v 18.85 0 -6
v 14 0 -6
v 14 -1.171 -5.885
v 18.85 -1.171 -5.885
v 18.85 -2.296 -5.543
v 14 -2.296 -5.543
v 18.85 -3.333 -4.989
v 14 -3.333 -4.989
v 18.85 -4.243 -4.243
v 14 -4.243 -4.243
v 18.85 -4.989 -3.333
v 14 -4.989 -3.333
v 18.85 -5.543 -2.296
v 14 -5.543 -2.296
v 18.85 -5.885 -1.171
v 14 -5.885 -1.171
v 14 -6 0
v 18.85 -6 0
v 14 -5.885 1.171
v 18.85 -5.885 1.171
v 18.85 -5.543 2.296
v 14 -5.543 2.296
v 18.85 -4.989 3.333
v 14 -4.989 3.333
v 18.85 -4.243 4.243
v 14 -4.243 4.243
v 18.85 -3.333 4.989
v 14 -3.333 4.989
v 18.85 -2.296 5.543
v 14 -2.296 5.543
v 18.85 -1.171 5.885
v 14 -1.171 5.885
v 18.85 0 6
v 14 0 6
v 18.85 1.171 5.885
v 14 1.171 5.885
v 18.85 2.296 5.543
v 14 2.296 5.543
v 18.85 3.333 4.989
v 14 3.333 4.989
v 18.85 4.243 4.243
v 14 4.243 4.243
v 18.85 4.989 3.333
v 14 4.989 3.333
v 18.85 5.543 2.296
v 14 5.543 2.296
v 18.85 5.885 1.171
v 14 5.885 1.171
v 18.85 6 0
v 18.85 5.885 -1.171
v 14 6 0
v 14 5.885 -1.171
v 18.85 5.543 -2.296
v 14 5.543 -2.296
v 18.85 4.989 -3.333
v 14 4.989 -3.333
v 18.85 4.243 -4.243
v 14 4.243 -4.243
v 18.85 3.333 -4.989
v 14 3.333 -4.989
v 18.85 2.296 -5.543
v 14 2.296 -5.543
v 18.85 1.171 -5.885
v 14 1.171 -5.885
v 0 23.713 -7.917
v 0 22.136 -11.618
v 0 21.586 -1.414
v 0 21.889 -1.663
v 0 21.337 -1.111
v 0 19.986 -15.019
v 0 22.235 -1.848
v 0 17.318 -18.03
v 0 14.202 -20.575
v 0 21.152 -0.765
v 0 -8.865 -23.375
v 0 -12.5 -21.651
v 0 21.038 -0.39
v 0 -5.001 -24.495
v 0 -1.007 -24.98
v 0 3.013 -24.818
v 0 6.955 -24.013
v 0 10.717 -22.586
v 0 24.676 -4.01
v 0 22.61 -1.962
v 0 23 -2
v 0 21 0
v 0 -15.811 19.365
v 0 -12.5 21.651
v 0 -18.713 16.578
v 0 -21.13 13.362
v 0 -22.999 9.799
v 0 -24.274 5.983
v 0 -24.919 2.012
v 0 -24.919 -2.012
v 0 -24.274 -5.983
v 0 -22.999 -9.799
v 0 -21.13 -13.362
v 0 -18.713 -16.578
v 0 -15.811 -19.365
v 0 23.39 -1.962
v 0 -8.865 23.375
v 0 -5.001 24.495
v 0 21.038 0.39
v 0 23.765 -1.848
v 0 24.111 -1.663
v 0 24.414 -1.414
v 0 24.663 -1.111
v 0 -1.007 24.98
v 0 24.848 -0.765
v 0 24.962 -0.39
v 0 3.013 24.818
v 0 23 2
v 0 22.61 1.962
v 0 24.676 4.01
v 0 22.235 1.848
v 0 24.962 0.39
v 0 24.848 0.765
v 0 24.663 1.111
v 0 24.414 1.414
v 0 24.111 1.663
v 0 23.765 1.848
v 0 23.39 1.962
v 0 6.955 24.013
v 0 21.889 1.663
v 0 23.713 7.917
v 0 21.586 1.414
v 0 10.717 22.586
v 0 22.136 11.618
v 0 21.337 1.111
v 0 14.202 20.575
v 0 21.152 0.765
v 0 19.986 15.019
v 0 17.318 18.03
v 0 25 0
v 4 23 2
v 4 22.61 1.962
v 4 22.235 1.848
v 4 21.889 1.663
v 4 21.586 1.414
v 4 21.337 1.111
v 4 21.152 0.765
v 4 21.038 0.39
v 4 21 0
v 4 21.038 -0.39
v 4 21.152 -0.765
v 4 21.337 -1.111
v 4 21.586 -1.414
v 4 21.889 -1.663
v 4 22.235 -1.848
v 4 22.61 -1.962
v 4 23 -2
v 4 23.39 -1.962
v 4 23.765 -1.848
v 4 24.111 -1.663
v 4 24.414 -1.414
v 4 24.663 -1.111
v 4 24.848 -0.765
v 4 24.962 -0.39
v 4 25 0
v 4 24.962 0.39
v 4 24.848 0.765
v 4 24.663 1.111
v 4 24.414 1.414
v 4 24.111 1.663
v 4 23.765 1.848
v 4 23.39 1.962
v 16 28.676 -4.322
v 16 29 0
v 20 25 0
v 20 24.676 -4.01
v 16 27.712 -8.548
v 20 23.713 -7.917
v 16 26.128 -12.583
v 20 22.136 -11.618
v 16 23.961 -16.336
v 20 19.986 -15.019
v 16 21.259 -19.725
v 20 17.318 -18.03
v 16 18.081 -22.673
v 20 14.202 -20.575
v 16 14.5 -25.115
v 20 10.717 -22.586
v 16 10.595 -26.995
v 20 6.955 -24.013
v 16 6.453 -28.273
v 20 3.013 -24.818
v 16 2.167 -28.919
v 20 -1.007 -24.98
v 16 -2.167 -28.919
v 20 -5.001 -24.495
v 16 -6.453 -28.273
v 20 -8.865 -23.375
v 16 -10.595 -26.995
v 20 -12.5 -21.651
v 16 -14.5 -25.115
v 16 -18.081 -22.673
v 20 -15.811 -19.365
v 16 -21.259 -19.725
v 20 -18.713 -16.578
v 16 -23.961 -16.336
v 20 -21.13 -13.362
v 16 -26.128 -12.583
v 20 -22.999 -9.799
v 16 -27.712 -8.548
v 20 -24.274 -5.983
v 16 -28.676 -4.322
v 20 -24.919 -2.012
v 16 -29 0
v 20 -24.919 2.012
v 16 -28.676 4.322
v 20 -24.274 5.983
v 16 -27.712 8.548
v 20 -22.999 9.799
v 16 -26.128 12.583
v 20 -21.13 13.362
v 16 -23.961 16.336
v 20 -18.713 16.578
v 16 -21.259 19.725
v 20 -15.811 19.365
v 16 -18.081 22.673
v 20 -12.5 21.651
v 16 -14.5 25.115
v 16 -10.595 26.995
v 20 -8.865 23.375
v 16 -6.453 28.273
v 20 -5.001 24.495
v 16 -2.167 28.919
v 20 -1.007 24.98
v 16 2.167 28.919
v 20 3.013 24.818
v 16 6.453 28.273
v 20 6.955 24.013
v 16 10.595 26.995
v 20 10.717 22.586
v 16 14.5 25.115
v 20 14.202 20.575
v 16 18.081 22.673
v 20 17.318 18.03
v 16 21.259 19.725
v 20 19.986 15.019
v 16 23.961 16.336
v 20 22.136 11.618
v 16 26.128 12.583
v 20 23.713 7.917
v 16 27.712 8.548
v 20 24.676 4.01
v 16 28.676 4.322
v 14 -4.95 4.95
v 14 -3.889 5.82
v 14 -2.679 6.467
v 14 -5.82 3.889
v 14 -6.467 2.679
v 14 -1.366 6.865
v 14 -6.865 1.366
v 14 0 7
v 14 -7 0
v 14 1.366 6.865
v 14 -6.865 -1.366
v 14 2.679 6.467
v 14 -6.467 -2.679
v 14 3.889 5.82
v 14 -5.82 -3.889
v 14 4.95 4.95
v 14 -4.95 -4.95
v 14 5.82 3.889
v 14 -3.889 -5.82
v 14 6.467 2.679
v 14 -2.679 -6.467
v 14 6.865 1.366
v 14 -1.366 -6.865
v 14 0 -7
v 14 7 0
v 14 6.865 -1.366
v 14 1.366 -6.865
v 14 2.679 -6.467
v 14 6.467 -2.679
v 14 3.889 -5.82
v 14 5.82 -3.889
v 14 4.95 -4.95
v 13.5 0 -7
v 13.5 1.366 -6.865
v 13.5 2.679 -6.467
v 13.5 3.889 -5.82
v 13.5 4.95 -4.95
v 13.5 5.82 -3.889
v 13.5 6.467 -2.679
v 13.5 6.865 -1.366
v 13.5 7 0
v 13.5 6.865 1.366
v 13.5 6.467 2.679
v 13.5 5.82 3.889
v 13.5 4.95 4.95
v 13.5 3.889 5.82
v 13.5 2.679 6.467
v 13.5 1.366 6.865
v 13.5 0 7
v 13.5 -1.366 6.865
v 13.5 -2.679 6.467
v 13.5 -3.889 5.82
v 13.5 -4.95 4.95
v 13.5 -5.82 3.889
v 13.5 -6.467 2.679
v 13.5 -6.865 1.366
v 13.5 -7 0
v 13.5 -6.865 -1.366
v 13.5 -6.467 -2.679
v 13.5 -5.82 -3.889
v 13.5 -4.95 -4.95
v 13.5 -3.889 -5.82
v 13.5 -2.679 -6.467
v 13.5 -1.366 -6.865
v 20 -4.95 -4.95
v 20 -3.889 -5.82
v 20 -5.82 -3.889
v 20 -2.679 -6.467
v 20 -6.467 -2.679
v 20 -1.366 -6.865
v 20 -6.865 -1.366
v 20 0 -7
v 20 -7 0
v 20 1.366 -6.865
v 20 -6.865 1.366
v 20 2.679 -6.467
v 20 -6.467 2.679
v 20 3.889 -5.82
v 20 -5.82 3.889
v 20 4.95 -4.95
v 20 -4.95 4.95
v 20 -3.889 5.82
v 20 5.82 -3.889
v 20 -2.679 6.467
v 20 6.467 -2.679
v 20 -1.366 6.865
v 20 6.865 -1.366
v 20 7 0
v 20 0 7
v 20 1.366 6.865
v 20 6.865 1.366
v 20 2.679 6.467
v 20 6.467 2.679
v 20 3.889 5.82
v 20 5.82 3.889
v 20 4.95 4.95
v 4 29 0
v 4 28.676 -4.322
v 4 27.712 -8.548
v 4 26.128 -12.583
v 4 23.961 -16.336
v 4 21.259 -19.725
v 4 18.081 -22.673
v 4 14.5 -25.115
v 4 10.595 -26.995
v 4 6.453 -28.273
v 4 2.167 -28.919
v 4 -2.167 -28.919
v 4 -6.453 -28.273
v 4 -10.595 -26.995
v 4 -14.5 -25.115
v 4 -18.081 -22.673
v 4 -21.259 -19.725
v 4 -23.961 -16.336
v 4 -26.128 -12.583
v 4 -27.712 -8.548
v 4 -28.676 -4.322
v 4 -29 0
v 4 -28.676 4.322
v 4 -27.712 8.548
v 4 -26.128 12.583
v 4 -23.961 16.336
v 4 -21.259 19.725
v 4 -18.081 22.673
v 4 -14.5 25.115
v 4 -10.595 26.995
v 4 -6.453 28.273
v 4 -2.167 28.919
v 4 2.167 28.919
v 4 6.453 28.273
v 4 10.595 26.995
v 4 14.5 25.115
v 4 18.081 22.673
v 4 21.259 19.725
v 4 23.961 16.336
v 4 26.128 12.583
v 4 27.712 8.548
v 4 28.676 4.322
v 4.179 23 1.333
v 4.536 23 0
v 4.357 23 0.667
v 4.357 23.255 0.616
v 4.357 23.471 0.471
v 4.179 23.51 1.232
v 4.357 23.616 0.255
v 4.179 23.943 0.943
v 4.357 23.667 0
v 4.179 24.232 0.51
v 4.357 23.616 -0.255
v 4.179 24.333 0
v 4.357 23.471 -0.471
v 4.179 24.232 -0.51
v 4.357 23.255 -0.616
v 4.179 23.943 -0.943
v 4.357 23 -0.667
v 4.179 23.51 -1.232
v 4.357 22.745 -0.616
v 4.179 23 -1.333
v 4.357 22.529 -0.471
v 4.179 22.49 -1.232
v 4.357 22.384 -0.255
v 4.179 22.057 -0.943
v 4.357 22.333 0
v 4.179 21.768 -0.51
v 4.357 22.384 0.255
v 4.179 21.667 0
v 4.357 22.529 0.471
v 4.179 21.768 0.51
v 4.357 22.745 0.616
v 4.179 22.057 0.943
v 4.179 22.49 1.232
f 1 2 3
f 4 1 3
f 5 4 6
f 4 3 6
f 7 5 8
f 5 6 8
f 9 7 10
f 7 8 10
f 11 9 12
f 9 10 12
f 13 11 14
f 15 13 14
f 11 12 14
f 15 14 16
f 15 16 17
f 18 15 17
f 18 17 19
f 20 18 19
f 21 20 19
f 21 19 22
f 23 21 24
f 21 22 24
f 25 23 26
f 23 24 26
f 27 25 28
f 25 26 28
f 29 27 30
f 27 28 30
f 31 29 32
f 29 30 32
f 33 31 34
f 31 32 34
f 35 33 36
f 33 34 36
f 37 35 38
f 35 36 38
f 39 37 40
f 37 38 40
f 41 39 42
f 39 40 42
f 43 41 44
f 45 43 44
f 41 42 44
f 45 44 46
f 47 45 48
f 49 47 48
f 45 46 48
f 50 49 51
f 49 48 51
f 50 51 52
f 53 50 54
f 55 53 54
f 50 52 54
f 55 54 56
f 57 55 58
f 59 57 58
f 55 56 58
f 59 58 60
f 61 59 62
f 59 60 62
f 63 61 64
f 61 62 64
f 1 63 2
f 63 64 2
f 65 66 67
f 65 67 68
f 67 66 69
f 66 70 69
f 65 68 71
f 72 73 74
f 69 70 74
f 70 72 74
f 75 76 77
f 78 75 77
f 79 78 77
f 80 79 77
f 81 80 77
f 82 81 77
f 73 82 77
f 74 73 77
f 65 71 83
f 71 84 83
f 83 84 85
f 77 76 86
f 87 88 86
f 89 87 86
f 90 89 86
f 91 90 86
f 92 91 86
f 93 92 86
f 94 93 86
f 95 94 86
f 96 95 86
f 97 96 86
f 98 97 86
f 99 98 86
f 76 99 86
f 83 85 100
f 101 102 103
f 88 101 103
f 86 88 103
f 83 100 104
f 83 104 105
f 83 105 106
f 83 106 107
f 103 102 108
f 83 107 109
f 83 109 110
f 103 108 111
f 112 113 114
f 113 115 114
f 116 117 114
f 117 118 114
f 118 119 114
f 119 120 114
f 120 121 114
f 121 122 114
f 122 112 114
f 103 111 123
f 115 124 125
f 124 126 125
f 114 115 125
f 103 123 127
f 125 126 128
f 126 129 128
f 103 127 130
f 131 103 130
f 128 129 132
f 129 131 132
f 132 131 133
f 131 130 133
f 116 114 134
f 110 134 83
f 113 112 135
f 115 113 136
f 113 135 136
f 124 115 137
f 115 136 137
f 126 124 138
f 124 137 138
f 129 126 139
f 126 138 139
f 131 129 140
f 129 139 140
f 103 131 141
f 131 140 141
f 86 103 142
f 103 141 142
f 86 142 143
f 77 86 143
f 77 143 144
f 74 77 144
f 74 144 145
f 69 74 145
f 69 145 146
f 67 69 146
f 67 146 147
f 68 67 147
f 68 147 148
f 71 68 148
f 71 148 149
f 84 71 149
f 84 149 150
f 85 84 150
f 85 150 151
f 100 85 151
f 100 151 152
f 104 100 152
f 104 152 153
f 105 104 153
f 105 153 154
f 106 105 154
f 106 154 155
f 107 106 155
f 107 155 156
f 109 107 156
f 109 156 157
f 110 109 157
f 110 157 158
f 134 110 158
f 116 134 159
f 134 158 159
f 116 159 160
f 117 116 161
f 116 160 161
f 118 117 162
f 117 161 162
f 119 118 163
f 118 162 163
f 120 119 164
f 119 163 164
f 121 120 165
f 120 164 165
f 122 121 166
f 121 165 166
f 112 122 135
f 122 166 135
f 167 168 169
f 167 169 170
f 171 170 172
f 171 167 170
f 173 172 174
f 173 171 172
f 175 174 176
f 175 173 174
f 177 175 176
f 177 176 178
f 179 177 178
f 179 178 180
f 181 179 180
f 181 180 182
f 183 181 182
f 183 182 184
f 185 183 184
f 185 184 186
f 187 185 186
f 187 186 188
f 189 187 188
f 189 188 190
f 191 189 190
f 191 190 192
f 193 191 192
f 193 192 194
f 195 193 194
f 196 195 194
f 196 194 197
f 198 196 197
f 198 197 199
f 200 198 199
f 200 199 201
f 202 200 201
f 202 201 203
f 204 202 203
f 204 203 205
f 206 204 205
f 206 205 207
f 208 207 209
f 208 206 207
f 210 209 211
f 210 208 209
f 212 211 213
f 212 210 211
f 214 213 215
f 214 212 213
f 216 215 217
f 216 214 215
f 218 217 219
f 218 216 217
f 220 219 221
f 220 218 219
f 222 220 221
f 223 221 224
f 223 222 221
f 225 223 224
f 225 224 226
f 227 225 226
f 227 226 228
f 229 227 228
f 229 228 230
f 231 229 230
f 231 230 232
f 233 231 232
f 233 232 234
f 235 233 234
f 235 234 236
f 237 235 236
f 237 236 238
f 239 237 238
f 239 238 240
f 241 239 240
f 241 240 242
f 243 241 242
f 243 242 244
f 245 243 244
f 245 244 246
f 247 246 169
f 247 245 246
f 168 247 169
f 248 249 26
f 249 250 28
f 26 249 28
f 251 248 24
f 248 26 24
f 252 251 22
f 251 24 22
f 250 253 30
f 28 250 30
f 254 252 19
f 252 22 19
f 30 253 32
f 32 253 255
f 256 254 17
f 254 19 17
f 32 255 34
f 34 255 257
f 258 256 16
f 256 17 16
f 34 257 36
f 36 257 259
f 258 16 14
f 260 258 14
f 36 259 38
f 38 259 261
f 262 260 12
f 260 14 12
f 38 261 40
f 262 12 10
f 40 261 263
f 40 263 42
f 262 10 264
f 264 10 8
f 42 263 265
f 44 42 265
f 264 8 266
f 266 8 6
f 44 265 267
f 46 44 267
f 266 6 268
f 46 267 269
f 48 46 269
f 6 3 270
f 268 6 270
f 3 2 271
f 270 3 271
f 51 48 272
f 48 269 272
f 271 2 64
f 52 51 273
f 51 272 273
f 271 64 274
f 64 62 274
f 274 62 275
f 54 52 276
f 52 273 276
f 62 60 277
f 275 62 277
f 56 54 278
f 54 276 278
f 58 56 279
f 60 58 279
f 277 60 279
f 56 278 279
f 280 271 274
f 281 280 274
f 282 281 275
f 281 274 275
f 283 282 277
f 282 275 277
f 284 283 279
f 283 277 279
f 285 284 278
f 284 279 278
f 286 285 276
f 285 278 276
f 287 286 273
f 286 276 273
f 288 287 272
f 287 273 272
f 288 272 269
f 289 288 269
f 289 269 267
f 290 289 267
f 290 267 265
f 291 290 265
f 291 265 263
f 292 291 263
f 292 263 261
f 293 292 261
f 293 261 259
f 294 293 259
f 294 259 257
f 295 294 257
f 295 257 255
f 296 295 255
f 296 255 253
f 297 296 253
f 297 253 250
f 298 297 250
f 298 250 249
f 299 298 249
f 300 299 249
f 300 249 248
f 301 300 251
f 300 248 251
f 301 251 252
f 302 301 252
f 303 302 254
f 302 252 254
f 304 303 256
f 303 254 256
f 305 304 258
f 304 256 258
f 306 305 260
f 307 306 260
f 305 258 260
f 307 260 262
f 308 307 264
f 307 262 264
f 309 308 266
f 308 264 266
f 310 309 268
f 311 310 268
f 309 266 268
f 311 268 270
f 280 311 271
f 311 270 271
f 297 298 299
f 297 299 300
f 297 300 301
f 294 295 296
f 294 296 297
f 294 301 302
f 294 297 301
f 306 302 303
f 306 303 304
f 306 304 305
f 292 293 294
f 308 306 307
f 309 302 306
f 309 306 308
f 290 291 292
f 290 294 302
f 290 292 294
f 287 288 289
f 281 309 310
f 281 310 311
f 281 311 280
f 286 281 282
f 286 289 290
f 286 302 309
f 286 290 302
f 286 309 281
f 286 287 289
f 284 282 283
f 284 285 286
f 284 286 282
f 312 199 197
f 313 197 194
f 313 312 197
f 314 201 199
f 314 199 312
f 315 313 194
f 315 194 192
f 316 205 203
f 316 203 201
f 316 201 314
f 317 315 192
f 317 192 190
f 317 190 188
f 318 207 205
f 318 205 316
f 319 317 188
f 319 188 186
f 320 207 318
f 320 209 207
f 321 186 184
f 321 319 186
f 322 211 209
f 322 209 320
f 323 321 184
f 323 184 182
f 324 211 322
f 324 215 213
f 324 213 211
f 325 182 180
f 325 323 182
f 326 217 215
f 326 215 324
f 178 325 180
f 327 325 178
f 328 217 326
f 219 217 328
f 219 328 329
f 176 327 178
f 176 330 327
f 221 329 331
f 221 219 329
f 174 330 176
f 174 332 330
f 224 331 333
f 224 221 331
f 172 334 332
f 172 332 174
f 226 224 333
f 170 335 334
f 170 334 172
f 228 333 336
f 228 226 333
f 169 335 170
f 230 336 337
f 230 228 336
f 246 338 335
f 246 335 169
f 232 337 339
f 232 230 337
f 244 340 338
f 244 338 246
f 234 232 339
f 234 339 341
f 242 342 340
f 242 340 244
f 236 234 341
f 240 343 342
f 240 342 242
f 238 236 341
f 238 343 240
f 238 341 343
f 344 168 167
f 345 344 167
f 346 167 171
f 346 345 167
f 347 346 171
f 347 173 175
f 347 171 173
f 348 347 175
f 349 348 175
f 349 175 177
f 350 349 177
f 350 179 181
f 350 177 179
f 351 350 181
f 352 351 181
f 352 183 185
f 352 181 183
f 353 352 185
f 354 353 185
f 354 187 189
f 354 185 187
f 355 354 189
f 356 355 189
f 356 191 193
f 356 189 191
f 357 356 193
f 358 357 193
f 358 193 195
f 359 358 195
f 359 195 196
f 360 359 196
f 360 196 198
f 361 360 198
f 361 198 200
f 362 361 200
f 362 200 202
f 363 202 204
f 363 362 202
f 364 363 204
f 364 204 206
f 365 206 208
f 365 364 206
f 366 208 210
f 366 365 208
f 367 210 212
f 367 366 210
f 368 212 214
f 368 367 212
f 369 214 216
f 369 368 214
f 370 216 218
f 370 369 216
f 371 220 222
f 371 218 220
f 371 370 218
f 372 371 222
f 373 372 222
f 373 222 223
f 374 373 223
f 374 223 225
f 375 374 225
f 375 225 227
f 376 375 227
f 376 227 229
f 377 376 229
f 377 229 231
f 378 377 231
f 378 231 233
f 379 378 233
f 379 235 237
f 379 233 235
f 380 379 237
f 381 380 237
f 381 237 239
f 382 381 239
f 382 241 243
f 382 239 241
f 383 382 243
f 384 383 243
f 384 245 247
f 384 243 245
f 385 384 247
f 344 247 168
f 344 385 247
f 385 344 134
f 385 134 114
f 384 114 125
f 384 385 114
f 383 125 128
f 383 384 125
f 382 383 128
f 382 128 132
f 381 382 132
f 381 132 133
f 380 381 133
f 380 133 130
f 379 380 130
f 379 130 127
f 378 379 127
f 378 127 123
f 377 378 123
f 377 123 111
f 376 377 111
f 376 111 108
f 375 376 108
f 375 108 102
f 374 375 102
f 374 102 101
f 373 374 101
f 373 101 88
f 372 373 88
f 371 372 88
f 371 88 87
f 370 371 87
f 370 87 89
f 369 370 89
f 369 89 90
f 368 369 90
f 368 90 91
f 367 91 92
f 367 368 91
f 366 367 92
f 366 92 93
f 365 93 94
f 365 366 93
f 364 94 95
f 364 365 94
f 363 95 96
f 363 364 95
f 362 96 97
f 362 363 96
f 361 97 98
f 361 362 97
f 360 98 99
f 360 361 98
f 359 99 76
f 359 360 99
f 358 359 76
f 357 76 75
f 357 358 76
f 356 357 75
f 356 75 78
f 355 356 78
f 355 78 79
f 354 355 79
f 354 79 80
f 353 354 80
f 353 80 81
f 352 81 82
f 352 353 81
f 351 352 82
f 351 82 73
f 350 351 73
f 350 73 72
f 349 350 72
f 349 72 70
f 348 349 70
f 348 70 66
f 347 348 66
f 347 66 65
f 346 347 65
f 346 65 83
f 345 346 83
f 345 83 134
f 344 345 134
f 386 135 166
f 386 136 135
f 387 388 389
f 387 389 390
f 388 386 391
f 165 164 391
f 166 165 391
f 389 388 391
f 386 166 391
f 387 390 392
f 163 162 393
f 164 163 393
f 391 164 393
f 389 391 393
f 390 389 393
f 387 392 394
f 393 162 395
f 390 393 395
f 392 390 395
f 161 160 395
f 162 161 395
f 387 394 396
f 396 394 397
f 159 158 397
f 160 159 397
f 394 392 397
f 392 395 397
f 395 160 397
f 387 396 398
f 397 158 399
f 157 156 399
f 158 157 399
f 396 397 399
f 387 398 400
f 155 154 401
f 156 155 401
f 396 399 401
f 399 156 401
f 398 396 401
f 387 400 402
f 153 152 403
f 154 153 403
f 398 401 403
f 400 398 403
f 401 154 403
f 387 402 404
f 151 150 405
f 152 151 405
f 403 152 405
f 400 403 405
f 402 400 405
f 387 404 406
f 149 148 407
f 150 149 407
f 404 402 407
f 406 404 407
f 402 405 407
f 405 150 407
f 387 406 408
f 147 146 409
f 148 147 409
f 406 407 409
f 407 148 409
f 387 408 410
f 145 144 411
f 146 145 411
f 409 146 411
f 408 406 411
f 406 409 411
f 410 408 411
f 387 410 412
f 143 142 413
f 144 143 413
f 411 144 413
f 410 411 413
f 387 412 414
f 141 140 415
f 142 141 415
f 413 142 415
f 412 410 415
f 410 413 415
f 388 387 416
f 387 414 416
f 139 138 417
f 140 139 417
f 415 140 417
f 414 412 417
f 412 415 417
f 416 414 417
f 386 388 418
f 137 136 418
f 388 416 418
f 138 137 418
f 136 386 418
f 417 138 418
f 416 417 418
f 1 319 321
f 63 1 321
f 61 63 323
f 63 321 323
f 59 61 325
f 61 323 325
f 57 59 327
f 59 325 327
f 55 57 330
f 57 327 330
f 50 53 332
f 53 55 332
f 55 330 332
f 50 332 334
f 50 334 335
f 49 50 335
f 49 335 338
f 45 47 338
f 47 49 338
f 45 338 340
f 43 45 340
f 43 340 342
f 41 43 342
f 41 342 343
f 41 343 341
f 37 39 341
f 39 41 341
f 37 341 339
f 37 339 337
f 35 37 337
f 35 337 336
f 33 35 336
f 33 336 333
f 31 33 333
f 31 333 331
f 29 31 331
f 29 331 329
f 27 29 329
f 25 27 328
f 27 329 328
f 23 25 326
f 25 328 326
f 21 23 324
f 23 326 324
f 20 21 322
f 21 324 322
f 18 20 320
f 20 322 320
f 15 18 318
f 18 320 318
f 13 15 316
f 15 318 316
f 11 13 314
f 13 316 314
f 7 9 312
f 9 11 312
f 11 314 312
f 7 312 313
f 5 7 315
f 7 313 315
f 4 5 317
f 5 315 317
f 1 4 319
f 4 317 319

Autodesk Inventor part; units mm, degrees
ref_plane "YZ Plane" through (0, 0, 0) normal (1, 0, 0) x (0, 1, 0)
ref_plane "XZ Plane" through (0, 0, 0) normal (0, 1, 0) x (-1, 0, 0)
ref_plane "XY Plane" through (0, 0, 0) normal (0, 0, 1) x (1, 0, 0)
sketch "Эскиз5" plane through (0, 0, 0) normal (0, 0, 1) x (1, 0, 0)
  line L0 (0, 0) -> (20, 0)
  line L1 (20, 0) -> (20, 25)
  line L2 (16, 29) -> (4, 29)
  line L3 (0, 25) -> (0, 0)
  line L4 (4, 29) -> (0, 25)
  line L5 (16, 29) -> (20, 25)
  point P0 (20, 29)
  point P1 (0, 29)
  dimension "d33" = 20
  dimension "d34" = 29
  dimension "d35" = 4
  dimension "d36" = 4
  dimension "d37" = 4
  dimension "d38" = 4
revolve "Вращение3" add sketch "Эскиз5" angle 360 about axis through (0, 0, 0) along (1, 0, 0)
sketch "Эскиз6" plane through (0, 0, 0) normal (-1, 0, 0) x (0, 0, 1)
  line L0 (0, 0) -> (0, 23) construction
  dimension "d40" = 23
hole "Отверстие3" at (0, 23, 0) direction (1, 0, 0) diameter 4 depth 4 tip angle 150
sketch "Эскиз7" plane through (20, 0, 0) normal (1, 0, 0) x (0, 0, -1)
  point P0 (0, 0)
  point P1 (0, 0)
hole "Отверстие4" at (20, 0, 0) direction (-1, 0, 0) diameter 12 depth 6 countersink diameter 14 countersink angle 82
sketch "Эскиз8" plane through (14, 0, 0) normal (1, 0, 0) x (0, 0, -1)
  circle A0 centre (0, 0) radius 7
  dimension "d55" = 14
extrude "Выдавливание1" cut sketch "Эскиз8" against normal blind 0.5
thread "Резьба4" size "M12x1.75" class "6H" standard "ANSI Metric M Profile" full length
equation "\"d36\" = d35"
equation "\"d37\" = d35"
equation "\"d38\" = d37"
properties part number "711132"
